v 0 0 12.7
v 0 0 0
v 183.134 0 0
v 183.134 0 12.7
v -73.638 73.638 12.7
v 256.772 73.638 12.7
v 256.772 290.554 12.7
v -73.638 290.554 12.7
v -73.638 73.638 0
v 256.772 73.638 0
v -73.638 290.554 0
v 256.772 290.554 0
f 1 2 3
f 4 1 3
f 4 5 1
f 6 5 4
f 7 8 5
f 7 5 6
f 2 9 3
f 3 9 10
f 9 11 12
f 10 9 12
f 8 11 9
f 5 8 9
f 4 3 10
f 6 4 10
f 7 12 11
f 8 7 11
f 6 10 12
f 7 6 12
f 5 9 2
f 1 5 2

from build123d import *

# Parameters (mm, degrees)
BOSS_EXTRUDE1_DEPTH = 12.7


with BuildPart() as part:
    # Sketch2 → Boss-Extrude1 (new body)
    with BuildSketch(Plane.XY):
        Polygon((0, 0), (183.134, 0), (256.772100193, 73.638100193), (256.772100193, 290.554100193), (-73.638100193, 290.554100193), (-73.638100193, 73.638100193), align=None)
    extrude(amount=BOSS_EXTRUDE1_DEPTH)


solid = part.part
